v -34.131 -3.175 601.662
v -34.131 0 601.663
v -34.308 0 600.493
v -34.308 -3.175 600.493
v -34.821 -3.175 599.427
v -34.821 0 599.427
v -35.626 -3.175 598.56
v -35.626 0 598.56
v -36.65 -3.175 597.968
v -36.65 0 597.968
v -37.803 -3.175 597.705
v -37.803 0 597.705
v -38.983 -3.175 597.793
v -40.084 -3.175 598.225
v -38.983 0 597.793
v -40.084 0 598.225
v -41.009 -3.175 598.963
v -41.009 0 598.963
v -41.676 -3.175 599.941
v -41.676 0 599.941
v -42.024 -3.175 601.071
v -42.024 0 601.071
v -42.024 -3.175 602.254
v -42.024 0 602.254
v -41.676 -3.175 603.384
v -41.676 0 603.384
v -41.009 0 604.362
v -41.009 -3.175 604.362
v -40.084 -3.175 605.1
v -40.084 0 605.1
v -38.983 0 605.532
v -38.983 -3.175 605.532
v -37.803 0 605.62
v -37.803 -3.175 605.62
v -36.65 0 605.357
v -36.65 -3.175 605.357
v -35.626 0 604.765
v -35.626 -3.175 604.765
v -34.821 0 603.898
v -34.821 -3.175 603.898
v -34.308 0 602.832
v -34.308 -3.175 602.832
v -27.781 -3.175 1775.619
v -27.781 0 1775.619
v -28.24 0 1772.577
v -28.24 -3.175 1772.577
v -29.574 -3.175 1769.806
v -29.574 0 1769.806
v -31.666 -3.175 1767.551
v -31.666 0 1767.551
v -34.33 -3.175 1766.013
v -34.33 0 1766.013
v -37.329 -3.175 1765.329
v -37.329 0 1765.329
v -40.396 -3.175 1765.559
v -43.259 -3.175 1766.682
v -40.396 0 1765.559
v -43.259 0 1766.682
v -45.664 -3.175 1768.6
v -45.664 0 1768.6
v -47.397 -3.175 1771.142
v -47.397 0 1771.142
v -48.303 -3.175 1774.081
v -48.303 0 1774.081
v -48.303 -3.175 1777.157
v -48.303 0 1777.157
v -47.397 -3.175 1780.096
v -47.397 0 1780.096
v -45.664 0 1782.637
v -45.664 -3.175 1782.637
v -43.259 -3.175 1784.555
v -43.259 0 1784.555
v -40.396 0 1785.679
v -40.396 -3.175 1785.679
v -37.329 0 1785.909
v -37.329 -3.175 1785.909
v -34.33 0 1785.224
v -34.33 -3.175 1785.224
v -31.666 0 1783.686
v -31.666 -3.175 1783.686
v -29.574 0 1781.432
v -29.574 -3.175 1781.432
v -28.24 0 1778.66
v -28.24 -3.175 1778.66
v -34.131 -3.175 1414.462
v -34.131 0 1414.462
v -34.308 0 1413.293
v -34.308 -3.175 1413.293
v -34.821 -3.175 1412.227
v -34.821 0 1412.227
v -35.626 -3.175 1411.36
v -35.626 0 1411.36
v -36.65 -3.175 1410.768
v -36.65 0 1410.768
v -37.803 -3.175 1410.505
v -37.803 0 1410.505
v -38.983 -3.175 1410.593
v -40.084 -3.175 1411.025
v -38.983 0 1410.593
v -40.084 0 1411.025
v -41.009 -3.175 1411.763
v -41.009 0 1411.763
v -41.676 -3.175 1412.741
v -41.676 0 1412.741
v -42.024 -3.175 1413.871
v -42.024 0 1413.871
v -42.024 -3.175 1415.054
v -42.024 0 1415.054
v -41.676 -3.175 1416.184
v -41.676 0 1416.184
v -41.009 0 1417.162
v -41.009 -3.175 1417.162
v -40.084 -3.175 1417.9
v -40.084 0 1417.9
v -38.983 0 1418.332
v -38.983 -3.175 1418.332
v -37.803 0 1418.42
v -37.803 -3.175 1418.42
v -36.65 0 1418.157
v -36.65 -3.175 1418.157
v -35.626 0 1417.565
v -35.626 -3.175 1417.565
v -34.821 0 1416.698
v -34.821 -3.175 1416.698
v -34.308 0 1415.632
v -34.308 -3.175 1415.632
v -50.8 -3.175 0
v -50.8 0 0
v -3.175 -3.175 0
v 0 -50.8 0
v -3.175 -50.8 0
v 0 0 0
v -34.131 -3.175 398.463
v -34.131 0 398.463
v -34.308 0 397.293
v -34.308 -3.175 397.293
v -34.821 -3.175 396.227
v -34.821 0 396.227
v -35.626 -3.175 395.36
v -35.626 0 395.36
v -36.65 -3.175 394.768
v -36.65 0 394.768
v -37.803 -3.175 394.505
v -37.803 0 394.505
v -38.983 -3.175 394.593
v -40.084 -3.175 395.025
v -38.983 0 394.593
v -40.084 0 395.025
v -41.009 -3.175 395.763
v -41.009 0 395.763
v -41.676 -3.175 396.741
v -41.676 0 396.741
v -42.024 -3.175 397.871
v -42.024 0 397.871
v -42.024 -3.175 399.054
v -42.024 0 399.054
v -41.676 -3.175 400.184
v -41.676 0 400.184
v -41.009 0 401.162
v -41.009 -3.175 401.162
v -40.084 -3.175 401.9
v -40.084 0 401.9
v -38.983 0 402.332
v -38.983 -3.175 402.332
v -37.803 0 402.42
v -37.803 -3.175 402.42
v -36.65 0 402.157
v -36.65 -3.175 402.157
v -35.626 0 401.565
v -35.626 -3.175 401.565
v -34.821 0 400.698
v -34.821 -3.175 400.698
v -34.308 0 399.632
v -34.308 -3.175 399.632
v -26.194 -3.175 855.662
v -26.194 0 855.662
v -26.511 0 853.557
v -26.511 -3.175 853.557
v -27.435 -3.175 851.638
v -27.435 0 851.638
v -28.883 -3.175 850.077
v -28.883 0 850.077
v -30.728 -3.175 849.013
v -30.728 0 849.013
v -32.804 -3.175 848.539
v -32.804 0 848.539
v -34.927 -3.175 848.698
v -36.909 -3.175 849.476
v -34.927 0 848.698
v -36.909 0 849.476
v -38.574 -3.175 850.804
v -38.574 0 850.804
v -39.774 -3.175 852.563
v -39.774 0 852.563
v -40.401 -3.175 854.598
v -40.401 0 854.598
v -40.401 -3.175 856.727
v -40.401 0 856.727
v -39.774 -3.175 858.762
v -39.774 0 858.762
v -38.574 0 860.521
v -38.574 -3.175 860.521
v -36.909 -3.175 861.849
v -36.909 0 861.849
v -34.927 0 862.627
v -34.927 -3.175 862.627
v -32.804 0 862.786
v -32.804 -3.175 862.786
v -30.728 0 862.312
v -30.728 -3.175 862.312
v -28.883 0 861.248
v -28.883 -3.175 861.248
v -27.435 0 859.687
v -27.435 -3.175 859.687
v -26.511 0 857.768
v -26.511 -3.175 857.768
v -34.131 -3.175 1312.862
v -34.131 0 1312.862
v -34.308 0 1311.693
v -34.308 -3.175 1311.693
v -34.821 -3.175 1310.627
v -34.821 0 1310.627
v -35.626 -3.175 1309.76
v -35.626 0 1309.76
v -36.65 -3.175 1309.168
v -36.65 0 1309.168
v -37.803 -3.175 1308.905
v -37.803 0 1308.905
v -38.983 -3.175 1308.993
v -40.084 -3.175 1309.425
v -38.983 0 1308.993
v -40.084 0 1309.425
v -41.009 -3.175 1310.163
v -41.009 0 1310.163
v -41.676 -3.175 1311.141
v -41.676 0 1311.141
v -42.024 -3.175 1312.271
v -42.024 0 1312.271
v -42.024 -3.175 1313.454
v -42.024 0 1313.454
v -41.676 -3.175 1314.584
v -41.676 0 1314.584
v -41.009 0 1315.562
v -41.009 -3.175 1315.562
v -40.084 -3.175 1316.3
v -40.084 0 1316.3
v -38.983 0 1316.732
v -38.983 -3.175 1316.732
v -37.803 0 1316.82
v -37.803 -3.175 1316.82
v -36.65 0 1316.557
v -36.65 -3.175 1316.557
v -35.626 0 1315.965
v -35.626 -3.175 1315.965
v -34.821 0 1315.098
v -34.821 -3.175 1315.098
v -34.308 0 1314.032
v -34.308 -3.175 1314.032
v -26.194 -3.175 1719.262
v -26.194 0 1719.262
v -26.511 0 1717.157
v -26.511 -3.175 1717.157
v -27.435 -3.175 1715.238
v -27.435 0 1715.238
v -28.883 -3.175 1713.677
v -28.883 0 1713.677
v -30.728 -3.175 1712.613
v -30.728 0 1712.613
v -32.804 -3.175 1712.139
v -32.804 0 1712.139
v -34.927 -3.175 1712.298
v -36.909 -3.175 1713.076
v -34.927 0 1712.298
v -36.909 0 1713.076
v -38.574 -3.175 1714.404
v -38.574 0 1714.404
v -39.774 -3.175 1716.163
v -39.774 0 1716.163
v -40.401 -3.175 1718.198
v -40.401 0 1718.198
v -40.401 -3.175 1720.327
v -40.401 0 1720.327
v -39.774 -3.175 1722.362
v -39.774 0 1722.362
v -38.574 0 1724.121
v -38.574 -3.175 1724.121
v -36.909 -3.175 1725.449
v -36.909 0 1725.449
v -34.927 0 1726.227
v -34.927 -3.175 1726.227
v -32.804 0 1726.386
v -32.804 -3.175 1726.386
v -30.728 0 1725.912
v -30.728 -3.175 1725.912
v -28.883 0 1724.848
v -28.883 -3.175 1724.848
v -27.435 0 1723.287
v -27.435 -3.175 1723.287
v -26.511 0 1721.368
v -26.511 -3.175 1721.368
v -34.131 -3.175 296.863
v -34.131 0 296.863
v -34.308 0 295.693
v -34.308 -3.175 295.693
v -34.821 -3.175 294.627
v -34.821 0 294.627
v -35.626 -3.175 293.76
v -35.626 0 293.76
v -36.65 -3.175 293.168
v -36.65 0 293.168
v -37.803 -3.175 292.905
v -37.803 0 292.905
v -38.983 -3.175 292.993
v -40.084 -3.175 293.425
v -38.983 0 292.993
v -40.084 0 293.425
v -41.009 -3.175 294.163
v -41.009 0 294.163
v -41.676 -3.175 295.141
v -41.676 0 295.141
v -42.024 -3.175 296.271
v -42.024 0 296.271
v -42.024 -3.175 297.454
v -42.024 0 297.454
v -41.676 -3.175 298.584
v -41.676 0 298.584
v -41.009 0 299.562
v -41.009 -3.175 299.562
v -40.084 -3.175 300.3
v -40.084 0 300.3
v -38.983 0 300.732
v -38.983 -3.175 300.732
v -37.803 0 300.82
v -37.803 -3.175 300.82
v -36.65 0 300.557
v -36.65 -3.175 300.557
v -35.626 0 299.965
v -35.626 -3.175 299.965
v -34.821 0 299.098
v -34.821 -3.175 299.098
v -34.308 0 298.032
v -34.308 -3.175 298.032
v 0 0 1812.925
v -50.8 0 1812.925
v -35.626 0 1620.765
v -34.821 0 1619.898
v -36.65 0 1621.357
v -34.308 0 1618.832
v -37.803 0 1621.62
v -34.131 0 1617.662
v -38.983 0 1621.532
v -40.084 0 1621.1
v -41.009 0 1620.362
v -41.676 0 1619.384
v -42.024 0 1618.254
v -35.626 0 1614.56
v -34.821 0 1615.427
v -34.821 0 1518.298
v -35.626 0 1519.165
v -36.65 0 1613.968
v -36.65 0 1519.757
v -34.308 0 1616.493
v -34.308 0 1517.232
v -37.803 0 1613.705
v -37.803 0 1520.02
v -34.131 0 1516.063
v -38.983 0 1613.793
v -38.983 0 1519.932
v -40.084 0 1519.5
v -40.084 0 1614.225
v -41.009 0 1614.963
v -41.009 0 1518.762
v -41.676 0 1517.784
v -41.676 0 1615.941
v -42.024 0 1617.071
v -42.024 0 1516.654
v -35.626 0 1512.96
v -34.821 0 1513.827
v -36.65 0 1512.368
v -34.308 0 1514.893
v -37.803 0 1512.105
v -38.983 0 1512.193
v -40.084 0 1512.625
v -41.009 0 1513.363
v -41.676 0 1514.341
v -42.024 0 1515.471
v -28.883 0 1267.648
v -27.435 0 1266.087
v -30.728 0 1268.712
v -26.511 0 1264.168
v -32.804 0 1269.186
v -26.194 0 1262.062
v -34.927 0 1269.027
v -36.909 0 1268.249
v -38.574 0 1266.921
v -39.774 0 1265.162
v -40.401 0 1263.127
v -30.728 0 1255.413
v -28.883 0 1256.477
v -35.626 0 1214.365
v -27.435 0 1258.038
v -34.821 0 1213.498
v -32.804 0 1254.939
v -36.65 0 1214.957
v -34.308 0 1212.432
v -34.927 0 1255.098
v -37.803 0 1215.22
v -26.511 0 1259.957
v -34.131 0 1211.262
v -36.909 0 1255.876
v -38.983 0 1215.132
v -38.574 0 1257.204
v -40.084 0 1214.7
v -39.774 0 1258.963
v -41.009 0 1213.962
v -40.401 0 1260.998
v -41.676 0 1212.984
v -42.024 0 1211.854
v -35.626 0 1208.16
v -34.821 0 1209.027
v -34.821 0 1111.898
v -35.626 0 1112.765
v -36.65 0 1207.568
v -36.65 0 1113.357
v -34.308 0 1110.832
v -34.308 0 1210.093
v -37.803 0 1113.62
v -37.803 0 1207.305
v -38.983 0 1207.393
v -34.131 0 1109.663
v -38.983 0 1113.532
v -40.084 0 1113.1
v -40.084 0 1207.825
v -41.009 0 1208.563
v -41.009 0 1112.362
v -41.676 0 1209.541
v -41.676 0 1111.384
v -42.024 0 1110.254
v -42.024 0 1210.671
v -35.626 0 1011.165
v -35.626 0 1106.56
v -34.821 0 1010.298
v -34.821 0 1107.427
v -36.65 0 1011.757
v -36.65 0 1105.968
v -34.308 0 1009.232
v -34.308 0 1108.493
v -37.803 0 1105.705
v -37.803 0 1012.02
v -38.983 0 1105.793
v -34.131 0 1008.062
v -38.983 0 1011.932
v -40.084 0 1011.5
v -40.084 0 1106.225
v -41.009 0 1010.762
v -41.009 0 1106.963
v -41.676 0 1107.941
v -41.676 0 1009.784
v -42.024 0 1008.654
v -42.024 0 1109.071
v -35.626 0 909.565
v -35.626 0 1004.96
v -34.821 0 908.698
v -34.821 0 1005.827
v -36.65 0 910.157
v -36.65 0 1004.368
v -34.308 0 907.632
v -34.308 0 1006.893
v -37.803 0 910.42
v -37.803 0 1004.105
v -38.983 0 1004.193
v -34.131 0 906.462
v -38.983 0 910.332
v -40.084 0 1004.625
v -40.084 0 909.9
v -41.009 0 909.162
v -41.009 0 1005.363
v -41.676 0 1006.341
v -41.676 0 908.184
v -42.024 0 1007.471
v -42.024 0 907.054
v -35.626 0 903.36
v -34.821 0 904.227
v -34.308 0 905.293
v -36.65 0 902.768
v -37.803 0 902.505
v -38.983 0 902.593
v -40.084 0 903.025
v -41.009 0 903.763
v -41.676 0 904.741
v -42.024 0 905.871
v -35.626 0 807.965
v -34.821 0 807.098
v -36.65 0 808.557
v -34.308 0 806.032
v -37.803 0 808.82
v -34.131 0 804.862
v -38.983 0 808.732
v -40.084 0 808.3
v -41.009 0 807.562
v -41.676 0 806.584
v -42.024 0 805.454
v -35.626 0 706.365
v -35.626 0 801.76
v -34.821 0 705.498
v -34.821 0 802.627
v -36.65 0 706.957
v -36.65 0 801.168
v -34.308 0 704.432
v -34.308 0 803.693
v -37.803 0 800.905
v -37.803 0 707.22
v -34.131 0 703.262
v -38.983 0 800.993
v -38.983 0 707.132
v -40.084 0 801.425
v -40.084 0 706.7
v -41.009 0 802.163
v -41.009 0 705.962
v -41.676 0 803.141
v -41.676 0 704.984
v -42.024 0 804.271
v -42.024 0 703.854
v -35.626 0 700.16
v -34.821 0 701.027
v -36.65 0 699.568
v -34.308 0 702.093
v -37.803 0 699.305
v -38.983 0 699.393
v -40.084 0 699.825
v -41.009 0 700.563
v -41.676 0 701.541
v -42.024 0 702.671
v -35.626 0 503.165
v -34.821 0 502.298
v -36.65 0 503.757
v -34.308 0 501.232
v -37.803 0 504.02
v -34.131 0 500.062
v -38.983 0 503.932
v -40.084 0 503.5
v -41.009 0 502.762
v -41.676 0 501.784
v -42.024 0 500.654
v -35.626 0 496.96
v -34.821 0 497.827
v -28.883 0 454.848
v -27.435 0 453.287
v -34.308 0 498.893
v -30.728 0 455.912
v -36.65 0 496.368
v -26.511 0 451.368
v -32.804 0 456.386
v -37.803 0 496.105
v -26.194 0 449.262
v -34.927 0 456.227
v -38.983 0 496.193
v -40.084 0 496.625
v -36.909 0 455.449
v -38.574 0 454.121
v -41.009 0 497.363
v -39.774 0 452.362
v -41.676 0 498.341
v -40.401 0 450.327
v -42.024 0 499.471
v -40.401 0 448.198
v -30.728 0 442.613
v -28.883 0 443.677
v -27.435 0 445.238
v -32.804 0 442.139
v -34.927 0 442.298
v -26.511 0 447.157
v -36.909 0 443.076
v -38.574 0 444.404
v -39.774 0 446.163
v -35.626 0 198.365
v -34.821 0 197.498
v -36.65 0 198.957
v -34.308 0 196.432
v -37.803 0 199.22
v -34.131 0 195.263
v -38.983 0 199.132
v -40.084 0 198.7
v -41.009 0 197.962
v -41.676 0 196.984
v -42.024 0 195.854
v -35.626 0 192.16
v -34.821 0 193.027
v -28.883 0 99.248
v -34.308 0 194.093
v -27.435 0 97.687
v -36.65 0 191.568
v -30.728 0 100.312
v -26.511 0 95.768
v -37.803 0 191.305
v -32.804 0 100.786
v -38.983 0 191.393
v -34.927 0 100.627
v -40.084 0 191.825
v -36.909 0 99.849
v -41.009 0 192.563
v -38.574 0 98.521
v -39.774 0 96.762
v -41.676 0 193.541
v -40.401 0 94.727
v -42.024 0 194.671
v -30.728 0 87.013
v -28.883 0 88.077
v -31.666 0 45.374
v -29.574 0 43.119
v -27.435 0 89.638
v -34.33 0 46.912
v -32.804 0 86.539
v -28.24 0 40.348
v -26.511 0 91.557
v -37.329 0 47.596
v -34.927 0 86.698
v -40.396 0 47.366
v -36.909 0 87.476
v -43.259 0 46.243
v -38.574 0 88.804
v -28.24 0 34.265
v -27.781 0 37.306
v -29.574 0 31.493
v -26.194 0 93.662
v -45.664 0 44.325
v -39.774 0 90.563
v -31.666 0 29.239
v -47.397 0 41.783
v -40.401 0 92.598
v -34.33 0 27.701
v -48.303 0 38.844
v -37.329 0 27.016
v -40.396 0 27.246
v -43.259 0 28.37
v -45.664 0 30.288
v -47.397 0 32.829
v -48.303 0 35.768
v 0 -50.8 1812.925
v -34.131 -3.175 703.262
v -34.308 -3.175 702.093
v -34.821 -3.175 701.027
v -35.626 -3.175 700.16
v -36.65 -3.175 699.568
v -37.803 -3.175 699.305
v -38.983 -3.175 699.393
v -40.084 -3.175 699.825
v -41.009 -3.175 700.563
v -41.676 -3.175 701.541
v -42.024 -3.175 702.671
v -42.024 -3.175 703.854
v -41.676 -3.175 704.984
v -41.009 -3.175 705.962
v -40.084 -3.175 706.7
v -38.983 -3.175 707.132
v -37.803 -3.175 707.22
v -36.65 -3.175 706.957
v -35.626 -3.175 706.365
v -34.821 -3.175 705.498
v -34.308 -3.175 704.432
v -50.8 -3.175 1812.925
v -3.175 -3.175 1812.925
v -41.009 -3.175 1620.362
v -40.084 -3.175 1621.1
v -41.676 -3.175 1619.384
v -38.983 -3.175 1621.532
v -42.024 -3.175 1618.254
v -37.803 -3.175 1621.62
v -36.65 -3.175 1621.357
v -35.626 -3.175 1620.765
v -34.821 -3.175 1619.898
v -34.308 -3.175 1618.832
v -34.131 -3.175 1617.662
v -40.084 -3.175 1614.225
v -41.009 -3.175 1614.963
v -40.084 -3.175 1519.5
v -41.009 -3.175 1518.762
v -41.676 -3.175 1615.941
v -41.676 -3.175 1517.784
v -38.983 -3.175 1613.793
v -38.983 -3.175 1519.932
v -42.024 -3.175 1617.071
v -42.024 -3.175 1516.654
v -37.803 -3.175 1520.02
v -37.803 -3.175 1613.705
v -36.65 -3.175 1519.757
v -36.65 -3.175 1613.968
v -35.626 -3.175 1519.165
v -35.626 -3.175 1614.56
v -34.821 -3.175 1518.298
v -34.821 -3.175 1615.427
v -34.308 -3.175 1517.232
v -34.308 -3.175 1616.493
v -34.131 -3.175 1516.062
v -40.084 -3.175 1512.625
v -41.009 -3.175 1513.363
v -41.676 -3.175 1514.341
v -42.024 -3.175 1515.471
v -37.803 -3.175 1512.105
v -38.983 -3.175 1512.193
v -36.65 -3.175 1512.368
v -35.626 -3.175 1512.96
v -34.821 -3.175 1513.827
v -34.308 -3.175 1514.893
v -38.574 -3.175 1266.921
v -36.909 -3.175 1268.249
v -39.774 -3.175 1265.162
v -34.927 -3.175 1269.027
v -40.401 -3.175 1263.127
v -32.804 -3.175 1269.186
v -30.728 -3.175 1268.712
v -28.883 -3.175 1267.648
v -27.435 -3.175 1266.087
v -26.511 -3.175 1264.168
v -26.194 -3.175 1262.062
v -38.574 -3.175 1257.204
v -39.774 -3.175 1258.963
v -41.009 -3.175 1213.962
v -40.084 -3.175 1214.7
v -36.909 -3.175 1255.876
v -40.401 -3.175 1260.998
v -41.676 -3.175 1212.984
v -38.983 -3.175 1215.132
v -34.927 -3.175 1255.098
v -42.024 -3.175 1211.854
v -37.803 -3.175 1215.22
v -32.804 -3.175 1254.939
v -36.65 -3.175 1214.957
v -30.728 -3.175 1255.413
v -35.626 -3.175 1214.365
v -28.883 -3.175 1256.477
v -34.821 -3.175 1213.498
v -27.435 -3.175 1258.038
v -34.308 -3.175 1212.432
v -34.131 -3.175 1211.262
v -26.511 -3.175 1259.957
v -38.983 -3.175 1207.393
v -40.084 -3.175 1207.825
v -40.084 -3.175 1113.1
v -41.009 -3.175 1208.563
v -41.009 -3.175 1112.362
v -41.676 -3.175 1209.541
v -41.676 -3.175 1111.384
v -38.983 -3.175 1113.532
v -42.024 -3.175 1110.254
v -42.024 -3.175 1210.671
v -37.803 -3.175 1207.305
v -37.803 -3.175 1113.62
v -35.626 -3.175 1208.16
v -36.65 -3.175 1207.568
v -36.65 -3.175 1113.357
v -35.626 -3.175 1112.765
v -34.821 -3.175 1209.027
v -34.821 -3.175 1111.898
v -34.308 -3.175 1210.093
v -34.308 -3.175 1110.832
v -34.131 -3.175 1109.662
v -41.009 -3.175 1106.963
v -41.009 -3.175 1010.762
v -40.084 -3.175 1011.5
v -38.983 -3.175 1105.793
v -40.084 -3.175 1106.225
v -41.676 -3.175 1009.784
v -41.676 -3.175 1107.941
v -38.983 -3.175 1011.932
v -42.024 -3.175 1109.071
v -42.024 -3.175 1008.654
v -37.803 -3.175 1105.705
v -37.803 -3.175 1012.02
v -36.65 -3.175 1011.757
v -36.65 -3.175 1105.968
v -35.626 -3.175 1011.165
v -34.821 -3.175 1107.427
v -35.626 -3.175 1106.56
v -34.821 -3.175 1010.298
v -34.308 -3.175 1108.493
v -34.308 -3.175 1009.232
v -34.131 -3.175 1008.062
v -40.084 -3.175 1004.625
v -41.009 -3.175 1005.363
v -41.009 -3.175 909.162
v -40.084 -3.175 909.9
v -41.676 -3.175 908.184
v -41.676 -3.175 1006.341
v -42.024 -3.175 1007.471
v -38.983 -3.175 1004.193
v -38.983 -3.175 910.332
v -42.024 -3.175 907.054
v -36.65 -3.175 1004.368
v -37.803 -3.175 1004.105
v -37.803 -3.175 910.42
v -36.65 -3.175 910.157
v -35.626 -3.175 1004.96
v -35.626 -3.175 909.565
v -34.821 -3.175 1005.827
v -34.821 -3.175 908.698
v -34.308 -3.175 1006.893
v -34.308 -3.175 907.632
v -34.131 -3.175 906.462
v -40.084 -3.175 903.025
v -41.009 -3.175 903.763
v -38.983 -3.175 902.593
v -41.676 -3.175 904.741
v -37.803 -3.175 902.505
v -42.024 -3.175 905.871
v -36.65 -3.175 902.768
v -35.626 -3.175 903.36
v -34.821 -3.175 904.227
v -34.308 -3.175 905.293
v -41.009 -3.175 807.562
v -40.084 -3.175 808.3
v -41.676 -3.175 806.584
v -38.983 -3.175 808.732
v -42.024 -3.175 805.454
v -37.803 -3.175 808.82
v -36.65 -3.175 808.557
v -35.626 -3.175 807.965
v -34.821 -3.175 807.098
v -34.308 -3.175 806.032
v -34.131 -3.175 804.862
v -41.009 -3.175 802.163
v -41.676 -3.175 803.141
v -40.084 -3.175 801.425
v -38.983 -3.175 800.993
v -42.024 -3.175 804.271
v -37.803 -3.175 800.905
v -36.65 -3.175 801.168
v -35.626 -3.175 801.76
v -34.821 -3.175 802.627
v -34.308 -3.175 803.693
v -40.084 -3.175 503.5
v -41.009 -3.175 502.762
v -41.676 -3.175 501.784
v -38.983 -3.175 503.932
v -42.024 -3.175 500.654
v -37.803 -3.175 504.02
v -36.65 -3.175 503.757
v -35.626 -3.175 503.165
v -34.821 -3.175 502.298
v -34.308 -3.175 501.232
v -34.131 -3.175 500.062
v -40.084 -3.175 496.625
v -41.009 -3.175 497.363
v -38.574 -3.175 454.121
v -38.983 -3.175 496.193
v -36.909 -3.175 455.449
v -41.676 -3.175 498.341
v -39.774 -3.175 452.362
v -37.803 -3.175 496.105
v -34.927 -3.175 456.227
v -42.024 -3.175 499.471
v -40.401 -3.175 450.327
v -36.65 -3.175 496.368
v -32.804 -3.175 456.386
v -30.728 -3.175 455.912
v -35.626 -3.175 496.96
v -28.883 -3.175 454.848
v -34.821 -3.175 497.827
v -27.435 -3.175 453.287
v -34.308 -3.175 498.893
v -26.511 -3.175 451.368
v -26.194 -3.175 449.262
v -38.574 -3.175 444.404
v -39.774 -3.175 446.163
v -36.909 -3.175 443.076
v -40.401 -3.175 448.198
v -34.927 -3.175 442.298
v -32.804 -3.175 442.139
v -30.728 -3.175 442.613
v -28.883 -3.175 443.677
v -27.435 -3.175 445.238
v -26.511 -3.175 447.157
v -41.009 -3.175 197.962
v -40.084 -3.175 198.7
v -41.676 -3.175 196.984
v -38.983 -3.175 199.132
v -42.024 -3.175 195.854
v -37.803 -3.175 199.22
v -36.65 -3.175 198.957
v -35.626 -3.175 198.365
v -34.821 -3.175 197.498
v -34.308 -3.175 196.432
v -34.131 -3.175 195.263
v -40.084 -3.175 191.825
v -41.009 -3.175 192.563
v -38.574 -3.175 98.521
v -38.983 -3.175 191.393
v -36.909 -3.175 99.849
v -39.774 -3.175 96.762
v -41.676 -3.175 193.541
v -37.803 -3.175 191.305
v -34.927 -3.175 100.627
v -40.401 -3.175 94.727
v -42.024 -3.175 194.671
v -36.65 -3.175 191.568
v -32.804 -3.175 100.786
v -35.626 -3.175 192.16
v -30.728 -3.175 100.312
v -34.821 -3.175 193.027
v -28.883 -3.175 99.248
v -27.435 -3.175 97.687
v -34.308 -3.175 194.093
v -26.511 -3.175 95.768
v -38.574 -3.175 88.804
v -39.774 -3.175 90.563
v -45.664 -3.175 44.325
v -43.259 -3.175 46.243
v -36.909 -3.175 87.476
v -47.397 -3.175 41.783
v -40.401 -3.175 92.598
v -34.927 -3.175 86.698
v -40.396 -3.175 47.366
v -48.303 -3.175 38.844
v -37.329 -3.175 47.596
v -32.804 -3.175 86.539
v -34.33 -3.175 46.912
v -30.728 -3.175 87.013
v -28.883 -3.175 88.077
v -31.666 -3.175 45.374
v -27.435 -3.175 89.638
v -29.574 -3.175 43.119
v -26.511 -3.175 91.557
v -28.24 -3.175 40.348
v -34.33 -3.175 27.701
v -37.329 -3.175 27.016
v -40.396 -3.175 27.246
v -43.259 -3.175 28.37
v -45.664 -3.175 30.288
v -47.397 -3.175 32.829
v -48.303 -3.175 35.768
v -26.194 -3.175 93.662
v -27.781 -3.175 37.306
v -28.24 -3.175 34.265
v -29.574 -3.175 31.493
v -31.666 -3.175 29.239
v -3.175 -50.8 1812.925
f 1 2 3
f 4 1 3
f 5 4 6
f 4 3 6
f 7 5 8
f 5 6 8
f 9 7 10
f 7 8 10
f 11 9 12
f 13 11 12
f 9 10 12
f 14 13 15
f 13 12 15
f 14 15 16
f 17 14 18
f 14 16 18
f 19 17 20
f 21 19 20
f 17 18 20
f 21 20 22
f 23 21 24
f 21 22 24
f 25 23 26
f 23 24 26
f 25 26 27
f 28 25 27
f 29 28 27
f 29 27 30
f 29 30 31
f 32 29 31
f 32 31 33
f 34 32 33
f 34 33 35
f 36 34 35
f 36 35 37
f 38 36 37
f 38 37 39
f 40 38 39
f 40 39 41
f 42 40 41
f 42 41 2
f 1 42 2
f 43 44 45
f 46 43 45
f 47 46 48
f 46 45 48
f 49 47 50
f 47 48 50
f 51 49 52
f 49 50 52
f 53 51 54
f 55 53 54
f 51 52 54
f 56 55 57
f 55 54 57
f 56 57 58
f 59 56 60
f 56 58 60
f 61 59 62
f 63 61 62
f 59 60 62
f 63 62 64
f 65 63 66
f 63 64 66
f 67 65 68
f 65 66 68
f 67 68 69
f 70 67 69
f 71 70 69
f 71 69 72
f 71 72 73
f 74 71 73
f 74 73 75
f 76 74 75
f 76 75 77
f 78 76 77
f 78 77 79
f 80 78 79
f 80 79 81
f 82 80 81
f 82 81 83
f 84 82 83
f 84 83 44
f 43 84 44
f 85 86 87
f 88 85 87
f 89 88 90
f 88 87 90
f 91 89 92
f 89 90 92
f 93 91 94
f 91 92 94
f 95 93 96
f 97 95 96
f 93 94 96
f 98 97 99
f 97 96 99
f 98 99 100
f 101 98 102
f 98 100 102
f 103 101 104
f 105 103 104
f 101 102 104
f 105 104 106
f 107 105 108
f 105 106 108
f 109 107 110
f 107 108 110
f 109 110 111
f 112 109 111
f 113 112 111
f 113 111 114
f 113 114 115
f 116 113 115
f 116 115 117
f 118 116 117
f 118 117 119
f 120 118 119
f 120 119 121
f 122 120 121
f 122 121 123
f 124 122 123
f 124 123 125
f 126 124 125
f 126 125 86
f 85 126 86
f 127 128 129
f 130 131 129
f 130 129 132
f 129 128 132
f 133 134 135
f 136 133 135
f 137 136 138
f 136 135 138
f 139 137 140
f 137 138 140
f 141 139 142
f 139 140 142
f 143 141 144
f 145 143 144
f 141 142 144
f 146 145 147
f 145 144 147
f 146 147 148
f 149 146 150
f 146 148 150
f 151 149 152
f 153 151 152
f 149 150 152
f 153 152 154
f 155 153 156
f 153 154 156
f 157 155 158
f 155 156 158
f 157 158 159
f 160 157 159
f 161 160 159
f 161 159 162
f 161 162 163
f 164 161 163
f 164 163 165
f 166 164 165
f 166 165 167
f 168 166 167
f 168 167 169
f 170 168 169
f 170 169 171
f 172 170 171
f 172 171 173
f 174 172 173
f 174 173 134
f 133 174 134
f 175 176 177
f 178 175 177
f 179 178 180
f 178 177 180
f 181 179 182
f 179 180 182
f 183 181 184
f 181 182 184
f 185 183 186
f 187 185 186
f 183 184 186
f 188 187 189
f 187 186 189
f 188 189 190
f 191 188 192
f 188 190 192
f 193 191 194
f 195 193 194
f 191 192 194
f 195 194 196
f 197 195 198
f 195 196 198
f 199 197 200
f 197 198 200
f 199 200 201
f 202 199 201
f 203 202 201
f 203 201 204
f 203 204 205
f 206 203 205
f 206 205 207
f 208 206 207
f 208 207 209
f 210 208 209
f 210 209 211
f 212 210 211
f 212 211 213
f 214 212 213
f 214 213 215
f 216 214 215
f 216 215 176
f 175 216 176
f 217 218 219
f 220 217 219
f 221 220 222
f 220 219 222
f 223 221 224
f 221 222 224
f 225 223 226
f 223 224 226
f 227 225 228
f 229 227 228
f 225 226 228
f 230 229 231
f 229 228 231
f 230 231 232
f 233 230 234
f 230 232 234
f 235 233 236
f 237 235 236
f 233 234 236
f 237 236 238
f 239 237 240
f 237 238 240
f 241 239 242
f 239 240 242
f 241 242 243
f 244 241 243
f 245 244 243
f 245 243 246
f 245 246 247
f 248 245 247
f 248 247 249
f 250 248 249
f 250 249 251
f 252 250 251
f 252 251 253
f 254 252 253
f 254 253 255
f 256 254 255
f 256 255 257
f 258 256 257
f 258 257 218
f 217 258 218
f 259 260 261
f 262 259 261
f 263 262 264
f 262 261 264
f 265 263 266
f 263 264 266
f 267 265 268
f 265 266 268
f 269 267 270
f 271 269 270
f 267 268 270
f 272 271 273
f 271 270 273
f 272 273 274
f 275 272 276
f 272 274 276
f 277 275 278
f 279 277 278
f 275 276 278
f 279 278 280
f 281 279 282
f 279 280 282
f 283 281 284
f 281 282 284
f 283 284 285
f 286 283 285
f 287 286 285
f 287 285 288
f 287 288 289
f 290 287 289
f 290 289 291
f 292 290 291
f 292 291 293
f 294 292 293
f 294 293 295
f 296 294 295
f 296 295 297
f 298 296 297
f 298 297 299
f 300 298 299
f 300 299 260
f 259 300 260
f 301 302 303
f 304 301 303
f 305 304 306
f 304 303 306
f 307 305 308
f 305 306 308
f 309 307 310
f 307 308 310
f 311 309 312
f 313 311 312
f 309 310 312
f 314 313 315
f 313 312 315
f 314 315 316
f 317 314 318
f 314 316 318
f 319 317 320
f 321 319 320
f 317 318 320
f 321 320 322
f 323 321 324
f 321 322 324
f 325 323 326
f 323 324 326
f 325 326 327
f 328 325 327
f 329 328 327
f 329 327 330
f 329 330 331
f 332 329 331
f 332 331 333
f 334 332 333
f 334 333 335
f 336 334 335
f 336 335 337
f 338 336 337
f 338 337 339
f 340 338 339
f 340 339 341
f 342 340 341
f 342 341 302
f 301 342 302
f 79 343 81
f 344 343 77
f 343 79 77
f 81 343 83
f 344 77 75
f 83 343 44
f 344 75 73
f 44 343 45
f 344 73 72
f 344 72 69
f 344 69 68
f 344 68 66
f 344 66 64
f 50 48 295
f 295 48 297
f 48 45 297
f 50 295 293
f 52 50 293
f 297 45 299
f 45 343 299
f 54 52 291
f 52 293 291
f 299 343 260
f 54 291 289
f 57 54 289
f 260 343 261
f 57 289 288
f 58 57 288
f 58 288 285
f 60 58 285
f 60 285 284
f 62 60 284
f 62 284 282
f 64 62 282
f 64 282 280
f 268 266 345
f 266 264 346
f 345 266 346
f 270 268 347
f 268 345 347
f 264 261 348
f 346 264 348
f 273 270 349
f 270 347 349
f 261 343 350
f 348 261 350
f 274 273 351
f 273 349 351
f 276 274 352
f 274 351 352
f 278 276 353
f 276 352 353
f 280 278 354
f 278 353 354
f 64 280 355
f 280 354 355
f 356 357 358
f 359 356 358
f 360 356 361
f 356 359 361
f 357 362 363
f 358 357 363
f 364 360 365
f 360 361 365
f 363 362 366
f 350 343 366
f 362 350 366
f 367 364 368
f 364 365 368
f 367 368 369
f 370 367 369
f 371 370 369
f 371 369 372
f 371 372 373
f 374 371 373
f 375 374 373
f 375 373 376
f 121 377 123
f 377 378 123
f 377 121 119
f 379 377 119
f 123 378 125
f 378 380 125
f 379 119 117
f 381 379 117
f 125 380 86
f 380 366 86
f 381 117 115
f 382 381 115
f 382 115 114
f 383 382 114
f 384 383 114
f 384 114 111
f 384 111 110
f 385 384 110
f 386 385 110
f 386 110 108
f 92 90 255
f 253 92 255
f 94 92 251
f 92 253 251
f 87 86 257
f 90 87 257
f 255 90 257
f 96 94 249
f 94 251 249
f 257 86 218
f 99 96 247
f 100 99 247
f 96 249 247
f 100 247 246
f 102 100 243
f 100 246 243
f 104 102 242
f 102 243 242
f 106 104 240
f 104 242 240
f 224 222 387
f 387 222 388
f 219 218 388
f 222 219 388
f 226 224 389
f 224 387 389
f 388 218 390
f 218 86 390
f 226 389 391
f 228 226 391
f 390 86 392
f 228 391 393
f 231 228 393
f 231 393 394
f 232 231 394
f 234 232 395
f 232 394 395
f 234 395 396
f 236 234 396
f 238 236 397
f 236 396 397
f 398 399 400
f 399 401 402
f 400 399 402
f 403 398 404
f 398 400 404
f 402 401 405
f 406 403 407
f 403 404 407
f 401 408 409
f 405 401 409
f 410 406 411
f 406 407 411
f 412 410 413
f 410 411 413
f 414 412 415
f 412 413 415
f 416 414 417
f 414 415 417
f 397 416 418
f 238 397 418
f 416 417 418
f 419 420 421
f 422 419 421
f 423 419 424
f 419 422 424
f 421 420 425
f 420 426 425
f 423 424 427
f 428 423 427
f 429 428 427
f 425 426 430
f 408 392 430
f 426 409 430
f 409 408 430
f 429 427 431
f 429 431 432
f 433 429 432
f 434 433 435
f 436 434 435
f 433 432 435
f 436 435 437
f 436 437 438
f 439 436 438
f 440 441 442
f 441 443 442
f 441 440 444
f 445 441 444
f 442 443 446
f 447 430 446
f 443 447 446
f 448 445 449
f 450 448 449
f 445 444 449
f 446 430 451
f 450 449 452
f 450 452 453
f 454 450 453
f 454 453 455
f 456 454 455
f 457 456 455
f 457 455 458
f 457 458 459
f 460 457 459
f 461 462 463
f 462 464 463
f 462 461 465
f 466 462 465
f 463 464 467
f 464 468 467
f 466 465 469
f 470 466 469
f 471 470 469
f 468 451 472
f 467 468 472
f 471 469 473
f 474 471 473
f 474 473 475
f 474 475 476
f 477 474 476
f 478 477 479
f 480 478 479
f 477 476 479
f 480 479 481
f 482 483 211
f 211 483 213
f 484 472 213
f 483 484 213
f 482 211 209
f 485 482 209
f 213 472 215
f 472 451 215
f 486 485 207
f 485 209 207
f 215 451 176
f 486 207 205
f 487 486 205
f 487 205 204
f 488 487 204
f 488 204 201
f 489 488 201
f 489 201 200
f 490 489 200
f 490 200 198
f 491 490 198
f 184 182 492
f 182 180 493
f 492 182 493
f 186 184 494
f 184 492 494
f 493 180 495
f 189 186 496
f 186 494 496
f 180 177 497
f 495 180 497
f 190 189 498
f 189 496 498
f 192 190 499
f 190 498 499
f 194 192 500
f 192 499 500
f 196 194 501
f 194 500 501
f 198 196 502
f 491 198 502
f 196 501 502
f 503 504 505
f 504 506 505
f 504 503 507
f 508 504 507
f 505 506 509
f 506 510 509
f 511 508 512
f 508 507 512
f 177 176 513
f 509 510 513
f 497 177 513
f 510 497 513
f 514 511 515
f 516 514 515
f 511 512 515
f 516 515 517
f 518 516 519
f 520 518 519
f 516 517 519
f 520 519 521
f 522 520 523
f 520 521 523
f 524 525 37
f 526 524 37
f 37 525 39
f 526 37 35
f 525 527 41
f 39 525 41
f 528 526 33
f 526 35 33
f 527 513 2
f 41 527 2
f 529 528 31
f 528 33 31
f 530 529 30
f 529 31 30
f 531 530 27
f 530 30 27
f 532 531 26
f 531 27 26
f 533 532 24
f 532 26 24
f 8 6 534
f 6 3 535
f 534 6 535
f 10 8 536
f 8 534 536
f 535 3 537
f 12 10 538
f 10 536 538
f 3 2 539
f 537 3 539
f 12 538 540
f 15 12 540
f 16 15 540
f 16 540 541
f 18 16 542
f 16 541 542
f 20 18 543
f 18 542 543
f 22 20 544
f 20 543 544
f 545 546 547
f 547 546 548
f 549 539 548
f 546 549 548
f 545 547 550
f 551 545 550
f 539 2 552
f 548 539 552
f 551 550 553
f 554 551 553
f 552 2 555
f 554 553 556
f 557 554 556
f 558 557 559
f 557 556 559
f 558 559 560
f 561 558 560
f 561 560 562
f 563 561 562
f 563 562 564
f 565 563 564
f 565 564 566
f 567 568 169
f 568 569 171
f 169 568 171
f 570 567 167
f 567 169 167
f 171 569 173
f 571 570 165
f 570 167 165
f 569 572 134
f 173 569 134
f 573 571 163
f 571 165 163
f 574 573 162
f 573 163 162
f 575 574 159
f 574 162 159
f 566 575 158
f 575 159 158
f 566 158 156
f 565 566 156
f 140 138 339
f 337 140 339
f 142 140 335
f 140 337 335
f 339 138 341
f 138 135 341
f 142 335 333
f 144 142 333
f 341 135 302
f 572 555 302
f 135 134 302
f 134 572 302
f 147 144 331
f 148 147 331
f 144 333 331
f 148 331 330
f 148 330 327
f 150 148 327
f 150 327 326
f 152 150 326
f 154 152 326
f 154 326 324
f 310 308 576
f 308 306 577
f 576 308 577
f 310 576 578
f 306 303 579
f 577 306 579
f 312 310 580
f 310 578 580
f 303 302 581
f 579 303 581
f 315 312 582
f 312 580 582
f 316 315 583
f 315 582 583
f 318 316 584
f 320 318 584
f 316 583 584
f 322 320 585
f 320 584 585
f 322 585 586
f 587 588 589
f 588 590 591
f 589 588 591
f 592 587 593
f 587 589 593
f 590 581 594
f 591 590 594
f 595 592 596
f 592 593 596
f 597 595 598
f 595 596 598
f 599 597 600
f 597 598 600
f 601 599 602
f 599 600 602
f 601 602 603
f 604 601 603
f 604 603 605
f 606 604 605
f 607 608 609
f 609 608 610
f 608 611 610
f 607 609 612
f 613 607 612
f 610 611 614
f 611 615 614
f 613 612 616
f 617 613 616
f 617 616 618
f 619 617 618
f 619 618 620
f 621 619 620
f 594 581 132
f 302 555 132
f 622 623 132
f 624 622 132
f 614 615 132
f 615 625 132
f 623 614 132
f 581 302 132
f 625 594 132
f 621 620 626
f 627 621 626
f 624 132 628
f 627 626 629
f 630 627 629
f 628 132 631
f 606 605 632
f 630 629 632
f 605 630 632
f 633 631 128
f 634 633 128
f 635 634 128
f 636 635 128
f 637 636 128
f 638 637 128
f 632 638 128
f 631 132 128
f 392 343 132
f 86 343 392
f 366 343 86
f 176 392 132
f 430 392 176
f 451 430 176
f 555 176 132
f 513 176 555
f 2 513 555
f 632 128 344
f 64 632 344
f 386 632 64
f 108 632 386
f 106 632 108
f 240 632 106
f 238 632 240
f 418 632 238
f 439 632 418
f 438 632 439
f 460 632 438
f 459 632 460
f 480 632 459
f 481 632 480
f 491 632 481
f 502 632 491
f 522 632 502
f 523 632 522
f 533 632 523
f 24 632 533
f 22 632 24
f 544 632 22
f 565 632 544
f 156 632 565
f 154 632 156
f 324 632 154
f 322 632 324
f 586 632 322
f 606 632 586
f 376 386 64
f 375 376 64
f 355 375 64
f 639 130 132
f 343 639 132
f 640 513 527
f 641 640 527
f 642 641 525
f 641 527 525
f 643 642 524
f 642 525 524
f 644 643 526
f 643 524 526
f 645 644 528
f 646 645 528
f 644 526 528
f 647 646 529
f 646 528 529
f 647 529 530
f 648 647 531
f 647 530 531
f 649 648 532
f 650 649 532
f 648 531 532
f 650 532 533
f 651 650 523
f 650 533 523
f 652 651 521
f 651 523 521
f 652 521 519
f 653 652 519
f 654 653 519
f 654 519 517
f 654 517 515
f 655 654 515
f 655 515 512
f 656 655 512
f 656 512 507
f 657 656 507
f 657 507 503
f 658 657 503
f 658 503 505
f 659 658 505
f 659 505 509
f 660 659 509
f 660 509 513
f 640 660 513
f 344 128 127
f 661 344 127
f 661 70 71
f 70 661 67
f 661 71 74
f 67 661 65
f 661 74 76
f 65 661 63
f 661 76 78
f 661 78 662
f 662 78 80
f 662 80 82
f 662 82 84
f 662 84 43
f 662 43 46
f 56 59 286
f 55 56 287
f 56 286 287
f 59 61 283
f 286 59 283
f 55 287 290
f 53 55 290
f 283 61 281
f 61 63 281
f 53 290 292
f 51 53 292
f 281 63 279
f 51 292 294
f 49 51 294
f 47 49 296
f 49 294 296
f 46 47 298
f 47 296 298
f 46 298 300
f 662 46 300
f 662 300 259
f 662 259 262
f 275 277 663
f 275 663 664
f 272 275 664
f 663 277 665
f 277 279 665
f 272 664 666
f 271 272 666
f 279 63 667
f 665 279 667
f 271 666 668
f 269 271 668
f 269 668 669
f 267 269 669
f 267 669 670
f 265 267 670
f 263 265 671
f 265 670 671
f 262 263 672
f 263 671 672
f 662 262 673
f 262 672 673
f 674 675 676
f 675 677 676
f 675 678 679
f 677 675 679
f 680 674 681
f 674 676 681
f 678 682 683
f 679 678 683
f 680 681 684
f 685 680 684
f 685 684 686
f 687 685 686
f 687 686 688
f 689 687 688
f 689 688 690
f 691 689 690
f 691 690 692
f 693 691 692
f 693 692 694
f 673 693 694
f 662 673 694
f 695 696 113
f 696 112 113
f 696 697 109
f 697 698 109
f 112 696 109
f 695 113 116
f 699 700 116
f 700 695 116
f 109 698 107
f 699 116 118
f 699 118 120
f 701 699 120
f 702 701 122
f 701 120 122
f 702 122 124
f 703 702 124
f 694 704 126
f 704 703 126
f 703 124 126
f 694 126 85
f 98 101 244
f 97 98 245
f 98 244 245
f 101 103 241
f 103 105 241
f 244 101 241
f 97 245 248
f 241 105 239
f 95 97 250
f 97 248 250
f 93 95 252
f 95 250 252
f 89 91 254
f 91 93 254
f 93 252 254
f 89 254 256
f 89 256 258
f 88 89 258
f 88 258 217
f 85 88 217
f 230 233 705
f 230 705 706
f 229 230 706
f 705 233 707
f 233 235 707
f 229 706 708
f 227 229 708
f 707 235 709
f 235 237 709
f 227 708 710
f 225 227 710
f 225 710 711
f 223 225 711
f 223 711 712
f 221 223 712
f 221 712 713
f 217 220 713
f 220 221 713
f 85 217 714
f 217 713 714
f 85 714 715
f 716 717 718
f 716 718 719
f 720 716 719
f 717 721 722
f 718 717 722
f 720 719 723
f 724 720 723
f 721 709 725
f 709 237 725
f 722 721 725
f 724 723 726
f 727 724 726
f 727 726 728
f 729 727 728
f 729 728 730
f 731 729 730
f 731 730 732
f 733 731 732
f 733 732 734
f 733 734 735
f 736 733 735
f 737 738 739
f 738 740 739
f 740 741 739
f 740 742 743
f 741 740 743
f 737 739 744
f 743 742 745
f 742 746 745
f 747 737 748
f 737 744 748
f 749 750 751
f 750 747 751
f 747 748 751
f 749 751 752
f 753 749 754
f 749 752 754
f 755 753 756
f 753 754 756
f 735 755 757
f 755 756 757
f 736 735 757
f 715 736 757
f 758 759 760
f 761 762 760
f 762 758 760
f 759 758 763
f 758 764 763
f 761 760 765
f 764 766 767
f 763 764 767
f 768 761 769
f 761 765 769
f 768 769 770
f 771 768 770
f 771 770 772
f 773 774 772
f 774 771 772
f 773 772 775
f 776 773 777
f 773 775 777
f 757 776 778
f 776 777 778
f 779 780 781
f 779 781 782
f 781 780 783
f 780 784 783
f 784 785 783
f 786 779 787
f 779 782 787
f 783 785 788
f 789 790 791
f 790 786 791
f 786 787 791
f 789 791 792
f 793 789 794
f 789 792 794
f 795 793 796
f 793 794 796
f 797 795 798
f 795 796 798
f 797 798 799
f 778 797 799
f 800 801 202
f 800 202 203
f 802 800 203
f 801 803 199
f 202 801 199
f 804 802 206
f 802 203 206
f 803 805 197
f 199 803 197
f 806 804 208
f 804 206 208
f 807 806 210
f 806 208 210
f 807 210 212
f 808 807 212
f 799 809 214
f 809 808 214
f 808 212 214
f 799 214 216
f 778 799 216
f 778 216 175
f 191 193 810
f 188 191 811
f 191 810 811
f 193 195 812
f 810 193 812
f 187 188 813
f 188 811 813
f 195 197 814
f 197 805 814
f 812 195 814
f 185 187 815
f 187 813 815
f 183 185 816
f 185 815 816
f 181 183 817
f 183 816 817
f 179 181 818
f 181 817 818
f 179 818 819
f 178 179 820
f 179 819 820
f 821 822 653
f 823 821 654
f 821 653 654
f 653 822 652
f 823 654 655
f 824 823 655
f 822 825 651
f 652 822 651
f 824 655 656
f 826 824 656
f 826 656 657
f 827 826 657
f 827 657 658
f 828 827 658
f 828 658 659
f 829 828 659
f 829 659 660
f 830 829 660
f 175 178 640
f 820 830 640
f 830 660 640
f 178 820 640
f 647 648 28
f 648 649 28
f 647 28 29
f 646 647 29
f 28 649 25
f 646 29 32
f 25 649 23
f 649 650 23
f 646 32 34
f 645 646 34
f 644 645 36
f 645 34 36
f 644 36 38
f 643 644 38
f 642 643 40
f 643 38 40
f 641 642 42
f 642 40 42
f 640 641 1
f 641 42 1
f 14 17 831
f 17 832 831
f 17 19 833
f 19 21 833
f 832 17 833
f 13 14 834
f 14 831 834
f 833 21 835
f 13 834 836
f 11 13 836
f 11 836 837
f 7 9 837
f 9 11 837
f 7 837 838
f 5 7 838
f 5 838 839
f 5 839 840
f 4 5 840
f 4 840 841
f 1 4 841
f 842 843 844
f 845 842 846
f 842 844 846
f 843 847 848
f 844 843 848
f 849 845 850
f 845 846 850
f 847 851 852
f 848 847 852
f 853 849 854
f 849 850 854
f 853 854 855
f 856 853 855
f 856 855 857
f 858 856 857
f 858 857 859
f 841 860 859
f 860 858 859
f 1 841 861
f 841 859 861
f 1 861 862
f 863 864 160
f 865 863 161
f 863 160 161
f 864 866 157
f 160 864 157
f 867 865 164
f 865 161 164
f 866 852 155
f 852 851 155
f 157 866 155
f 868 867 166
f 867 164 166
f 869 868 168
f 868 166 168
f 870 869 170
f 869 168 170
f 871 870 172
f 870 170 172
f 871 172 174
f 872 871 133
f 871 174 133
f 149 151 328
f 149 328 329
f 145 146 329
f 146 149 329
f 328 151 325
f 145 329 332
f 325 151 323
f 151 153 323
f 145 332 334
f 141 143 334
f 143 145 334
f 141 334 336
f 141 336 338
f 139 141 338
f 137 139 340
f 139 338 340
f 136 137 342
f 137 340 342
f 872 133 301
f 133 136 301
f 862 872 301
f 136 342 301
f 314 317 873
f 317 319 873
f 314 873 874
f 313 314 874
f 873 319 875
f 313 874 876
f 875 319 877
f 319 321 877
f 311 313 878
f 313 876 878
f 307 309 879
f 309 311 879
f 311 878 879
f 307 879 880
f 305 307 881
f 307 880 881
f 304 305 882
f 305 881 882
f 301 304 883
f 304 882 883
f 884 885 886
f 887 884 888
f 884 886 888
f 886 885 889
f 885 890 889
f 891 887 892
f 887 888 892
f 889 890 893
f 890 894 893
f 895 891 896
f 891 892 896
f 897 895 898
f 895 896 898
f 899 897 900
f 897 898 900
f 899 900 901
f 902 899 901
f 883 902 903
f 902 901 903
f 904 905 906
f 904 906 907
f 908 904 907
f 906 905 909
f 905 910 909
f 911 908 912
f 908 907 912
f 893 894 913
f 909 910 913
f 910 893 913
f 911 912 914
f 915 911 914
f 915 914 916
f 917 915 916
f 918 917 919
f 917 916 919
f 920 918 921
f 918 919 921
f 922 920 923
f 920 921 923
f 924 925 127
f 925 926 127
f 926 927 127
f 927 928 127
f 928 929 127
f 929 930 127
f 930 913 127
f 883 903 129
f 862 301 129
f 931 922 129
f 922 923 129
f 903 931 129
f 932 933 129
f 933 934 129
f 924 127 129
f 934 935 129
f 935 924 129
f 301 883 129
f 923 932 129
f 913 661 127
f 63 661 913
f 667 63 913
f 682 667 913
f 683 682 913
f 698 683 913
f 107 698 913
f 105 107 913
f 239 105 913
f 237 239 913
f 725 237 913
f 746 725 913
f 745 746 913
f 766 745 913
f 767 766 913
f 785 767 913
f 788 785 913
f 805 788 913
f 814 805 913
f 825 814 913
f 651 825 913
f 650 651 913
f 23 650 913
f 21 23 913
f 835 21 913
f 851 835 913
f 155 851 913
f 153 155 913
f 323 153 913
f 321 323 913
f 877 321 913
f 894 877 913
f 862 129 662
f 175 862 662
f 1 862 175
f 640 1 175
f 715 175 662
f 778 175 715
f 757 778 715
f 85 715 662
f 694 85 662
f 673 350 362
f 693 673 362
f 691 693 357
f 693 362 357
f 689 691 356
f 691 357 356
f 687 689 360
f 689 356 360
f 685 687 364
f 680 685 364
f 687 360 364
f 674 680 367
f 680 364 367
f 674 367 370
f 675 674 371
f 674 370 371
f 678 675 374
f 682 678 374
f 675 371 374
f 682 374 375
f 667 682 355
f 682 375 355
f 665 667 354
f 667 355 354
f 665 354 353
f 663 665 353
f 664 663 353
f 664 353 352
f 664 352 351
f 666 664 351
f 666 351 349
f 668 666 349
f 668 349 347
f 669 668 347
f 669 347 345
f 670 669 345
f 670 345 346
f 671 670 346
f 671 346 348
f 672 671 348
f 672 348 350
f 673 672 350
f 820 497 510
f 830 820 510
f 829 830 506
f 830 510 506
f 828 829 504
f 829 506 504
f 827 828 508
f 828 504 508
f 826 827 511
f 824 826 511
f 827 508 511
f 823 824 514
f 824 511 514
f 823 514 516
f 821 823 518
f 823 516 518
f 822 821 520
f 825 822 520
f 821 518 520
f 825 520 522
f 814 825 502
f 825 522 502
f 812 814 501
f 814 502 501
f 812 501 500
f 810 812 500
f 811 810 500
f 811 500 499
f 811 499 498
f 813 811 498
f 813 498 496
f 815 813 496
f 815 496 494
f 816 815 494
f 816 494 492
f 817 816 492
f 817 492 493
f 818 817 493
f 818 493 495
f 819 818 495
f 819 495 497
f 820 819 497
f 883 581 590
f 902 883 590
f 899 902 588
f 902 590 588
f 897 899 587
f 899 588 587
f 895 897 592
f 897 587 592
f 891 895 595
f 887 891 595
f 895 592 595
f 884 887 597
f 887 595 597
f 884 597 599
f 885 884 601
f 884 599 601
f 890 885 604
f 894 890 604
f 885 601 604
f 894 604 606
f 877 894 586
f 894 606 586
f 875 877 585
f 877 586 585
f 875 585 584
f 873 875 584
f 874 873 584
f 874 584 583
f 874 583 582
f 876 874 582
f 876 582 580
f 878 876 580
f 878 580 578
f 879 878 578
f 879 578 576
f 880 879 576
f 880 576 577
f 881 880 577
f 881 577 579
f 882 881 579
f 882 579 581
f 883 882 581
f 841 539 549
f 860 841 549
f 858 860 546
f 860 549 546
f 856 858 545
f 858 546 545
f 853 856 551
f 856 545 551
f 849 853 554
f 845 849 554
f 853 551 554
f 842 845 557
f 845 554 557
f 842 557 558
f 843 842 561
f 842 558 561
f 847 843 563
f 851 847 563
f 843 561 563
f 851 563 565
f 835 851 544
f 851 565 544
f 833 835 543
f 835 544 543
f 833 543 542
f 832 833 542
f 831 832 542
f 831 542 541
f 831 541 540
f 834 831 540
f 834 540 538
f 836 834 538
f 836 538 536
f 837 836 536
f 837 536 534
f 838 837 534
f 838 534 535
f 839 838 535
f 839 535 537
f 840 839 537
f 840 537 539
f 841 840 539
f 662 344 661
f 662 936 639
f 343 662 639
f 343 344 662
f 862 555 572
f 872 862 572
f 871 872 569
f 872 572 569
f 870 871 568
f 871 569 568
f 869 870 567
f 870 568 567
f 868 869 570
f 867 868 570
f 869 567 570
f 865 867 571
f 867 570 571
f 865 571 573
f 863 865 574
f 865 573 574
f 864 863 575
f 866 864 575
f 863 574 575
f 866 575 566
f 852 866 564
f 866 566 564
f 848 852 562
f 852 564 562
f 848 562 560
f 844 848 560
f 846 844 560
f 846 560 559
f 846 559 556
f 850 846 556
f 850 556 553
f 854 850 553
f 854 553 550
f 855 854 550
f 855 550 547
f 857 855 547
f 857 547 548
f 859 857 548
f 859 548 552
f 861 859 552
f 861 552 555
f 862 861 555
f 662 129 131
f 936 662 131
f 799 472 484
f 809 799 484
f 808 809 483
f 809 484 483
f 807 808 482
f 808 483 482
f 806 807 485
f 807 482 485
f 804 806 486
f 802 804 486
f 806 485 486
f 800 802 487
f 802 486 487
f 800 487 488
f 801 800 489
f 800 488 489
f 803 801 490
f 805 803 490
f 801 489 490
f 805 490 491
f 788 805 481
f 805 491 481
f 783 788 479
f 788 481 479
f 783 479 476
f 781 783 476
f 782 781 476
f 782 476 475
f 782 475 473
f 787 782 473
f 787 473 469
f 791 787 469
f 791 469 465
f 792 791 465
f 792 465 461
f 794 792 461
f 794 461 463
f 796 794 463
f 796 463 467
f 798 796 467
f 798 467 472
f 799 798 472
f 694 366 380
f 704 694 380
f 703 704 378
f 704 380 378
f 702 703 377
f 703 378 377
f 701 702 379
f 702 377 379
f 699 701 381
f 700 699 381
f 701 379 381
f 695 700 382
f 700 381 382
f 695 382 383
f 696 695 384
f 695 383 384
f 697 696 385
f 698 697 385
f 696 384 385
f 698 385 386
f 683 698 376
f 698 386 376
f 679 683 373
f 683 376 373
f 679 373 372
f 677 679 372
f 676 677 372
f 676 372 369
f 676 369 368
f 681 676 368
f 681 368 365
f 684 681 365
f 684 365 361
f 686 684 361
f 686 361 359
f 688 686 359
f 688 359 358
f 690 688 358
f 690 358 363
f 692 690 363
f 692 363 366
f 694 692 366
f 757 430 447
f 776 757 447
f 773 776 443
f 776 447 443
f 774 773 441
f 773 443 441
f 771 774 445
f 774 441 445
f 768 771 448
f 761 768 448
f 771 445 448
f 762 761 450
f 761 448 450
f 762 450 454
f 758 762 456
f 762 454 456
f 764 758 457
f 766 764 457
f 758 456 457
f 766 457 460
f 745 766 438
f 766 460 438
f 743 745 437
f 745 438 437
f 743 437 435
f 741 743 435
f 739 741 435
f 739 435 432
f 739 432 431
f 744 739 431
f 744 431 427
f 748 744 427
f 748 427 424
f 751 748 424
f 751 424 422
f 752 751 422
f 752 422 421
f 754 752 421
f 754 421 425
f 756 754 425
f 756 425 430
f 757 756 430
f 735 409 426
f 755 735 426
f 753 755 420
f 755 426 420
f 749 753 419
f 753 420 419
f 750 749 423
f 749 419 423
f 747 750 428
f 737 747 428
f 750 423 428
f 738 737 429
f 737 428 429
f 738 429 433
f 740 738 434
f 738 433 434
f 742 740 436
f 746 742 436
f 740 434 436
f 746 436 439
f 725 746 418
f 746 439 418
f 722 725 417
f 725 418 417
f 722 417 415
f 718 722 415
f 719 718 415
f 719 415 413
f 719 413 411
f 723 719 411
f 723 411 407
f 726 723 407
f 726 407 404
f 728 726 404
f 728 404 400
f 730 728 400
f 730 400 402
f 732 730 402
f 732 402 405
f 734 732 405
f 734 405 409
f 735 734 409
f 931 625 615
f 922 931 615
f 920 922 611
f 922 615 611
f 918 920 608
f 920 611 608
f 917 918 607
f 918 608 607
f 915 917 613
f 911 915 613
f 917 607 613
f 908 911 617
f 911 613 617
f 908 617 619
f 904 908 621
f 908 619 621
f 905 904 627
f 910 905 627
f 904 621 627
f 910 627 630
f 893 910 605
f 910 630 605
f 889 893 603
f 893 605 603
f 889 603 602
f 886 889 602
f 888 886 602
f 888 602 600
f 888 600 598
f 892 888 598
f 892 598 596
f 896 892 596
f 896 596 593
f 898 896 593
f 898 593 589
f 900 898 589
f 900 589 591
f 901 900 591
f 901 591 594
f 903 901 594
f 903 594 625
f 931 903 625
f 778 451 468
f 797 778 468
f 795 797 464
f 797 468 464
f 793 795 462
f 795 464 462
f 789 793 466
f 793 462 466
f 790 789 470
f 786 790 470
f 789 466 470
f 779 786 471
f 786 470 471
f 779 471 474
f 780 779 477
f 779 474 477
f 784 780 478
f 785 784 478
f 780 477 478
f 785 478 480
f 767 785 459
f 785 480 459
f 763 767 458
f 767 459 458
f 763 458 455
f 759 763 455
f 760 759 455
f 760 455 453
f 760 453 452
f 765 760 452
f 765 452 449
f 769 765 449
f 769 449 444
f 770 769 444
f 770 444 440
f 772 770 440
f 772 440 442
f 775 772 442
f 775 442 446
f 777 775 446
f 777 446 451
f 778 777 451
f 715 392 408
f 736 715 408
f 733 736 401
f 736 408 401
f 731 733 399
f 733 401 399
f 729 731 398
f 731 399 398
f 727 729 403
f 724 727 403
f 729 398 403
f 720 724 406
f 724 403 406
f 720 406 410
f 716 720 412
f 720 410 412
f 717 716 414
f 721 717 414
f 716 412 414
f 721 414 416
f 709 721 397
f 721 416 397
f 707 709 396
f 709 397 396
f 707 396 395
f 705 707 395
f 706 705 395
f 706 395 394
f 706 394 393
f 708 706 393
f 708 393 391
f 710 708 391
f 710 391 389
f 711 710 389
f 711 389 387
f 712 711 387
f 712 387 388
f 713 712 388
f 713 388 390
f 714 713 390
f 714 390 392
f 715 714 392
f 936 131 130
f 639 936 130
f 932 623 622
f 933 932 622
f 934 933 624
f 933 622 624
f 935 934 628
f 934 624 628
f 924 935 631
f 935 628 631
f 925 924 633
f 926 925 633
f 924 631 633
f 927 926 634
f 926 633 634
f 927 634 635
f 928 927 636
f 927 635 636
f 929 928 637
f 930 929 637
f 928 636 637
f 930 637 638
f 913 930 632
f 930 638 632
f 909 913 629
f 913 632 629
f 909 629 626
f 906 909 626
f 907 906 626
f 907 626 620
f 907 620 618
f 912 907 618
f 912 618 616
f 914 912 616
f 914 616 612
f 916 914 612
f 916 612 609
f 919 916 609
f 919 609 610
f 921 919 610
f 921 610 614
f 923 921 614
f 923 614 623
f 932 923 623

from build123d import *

# Parameters (mm, degrees)
BOSS_EXTRUDE1_DEPTH = 1812.925
SKETCH2_R           = 10.31875
SKETCH2_R_2         = 7.14375
CUT_EXTRUDE1_DEPTH  = 51.8
SKETCH4_R           = 3.96875
CUT_EXTRUDE3_DEPTH  = 44.45
LPATTERN1_COUNT     = 15
LPATTERN1_PITCH     = 101.6


with BuildPart() as part:
    # Sketch1 → Boss-Extrude1 (new body)
    with BuildSketch(Plane.XY):
        Polygon((0, 0), (-50.8, 0), (-50.8, -3.175), (-3.175, -3.175), (-3.175, -50.8), (0, -50.8), align=None)
    extrude(amount=BOSS_EXTRUDE1_DEPTH)

    # Sketch2 → Cut-Extrude1 (cut, through all)
    with BuildSketch(Plane(origin=(0, 0, 0), x_dir=(1, 0, 0), z_dir=(0, 1, 0))):
        with Locations((-38.1, -37.30625)):
            Circle(SKETCH2_R)
        with Locations((-38.1, -1775.61875)):
            Circle(SKETCH2_R)
        with Locations((-33.3375, -93.6625)):
            Circle(SKETCH2_R_2)
        with Locations((-33.3375, -449.2625)):
            Circle(SKETCH2_R_2)
        with Locations((-33.3375, -855.6625)):
            Circle(SKETCH2_R_2)
        with Locations((-33.3375, -1262.0625)):
            Circle(SKETCH2_R_2)
        with Locations((-33.3375, -1719.2625)):
            Circle(SKETCH2_R_2)
    extrude(amount=-CUT_EXTRUDE1_DEPTH, mode=Mode.SUBTRACT)

    # Sketch4 → Cut-Extrude3 (cut)
    with BuildSketch(Plane(origin=(-2.029899632, 0, 893.163272881), x_dir=(1, 0, 0), z_dir=(0, 1, 0))):
        with Locations((-36.070100368, 697.900772881)):
            Circle(SKETCH4_R)
    cut_extrude3 = extrude(amount=-CUT_EXTRUDE3_DEPTH, mode=Mode.SUBTRACT)

    # LPattern1: Cut-Extrude3 ×15
    with Locations(*[(0, 0, i * LPATTERN1_PITCH) for i in range(1, LPATTERN1_COUNT)]):
        add(cut_extrude3, mode=Mode.SUBTRACT)


solid = part.part
